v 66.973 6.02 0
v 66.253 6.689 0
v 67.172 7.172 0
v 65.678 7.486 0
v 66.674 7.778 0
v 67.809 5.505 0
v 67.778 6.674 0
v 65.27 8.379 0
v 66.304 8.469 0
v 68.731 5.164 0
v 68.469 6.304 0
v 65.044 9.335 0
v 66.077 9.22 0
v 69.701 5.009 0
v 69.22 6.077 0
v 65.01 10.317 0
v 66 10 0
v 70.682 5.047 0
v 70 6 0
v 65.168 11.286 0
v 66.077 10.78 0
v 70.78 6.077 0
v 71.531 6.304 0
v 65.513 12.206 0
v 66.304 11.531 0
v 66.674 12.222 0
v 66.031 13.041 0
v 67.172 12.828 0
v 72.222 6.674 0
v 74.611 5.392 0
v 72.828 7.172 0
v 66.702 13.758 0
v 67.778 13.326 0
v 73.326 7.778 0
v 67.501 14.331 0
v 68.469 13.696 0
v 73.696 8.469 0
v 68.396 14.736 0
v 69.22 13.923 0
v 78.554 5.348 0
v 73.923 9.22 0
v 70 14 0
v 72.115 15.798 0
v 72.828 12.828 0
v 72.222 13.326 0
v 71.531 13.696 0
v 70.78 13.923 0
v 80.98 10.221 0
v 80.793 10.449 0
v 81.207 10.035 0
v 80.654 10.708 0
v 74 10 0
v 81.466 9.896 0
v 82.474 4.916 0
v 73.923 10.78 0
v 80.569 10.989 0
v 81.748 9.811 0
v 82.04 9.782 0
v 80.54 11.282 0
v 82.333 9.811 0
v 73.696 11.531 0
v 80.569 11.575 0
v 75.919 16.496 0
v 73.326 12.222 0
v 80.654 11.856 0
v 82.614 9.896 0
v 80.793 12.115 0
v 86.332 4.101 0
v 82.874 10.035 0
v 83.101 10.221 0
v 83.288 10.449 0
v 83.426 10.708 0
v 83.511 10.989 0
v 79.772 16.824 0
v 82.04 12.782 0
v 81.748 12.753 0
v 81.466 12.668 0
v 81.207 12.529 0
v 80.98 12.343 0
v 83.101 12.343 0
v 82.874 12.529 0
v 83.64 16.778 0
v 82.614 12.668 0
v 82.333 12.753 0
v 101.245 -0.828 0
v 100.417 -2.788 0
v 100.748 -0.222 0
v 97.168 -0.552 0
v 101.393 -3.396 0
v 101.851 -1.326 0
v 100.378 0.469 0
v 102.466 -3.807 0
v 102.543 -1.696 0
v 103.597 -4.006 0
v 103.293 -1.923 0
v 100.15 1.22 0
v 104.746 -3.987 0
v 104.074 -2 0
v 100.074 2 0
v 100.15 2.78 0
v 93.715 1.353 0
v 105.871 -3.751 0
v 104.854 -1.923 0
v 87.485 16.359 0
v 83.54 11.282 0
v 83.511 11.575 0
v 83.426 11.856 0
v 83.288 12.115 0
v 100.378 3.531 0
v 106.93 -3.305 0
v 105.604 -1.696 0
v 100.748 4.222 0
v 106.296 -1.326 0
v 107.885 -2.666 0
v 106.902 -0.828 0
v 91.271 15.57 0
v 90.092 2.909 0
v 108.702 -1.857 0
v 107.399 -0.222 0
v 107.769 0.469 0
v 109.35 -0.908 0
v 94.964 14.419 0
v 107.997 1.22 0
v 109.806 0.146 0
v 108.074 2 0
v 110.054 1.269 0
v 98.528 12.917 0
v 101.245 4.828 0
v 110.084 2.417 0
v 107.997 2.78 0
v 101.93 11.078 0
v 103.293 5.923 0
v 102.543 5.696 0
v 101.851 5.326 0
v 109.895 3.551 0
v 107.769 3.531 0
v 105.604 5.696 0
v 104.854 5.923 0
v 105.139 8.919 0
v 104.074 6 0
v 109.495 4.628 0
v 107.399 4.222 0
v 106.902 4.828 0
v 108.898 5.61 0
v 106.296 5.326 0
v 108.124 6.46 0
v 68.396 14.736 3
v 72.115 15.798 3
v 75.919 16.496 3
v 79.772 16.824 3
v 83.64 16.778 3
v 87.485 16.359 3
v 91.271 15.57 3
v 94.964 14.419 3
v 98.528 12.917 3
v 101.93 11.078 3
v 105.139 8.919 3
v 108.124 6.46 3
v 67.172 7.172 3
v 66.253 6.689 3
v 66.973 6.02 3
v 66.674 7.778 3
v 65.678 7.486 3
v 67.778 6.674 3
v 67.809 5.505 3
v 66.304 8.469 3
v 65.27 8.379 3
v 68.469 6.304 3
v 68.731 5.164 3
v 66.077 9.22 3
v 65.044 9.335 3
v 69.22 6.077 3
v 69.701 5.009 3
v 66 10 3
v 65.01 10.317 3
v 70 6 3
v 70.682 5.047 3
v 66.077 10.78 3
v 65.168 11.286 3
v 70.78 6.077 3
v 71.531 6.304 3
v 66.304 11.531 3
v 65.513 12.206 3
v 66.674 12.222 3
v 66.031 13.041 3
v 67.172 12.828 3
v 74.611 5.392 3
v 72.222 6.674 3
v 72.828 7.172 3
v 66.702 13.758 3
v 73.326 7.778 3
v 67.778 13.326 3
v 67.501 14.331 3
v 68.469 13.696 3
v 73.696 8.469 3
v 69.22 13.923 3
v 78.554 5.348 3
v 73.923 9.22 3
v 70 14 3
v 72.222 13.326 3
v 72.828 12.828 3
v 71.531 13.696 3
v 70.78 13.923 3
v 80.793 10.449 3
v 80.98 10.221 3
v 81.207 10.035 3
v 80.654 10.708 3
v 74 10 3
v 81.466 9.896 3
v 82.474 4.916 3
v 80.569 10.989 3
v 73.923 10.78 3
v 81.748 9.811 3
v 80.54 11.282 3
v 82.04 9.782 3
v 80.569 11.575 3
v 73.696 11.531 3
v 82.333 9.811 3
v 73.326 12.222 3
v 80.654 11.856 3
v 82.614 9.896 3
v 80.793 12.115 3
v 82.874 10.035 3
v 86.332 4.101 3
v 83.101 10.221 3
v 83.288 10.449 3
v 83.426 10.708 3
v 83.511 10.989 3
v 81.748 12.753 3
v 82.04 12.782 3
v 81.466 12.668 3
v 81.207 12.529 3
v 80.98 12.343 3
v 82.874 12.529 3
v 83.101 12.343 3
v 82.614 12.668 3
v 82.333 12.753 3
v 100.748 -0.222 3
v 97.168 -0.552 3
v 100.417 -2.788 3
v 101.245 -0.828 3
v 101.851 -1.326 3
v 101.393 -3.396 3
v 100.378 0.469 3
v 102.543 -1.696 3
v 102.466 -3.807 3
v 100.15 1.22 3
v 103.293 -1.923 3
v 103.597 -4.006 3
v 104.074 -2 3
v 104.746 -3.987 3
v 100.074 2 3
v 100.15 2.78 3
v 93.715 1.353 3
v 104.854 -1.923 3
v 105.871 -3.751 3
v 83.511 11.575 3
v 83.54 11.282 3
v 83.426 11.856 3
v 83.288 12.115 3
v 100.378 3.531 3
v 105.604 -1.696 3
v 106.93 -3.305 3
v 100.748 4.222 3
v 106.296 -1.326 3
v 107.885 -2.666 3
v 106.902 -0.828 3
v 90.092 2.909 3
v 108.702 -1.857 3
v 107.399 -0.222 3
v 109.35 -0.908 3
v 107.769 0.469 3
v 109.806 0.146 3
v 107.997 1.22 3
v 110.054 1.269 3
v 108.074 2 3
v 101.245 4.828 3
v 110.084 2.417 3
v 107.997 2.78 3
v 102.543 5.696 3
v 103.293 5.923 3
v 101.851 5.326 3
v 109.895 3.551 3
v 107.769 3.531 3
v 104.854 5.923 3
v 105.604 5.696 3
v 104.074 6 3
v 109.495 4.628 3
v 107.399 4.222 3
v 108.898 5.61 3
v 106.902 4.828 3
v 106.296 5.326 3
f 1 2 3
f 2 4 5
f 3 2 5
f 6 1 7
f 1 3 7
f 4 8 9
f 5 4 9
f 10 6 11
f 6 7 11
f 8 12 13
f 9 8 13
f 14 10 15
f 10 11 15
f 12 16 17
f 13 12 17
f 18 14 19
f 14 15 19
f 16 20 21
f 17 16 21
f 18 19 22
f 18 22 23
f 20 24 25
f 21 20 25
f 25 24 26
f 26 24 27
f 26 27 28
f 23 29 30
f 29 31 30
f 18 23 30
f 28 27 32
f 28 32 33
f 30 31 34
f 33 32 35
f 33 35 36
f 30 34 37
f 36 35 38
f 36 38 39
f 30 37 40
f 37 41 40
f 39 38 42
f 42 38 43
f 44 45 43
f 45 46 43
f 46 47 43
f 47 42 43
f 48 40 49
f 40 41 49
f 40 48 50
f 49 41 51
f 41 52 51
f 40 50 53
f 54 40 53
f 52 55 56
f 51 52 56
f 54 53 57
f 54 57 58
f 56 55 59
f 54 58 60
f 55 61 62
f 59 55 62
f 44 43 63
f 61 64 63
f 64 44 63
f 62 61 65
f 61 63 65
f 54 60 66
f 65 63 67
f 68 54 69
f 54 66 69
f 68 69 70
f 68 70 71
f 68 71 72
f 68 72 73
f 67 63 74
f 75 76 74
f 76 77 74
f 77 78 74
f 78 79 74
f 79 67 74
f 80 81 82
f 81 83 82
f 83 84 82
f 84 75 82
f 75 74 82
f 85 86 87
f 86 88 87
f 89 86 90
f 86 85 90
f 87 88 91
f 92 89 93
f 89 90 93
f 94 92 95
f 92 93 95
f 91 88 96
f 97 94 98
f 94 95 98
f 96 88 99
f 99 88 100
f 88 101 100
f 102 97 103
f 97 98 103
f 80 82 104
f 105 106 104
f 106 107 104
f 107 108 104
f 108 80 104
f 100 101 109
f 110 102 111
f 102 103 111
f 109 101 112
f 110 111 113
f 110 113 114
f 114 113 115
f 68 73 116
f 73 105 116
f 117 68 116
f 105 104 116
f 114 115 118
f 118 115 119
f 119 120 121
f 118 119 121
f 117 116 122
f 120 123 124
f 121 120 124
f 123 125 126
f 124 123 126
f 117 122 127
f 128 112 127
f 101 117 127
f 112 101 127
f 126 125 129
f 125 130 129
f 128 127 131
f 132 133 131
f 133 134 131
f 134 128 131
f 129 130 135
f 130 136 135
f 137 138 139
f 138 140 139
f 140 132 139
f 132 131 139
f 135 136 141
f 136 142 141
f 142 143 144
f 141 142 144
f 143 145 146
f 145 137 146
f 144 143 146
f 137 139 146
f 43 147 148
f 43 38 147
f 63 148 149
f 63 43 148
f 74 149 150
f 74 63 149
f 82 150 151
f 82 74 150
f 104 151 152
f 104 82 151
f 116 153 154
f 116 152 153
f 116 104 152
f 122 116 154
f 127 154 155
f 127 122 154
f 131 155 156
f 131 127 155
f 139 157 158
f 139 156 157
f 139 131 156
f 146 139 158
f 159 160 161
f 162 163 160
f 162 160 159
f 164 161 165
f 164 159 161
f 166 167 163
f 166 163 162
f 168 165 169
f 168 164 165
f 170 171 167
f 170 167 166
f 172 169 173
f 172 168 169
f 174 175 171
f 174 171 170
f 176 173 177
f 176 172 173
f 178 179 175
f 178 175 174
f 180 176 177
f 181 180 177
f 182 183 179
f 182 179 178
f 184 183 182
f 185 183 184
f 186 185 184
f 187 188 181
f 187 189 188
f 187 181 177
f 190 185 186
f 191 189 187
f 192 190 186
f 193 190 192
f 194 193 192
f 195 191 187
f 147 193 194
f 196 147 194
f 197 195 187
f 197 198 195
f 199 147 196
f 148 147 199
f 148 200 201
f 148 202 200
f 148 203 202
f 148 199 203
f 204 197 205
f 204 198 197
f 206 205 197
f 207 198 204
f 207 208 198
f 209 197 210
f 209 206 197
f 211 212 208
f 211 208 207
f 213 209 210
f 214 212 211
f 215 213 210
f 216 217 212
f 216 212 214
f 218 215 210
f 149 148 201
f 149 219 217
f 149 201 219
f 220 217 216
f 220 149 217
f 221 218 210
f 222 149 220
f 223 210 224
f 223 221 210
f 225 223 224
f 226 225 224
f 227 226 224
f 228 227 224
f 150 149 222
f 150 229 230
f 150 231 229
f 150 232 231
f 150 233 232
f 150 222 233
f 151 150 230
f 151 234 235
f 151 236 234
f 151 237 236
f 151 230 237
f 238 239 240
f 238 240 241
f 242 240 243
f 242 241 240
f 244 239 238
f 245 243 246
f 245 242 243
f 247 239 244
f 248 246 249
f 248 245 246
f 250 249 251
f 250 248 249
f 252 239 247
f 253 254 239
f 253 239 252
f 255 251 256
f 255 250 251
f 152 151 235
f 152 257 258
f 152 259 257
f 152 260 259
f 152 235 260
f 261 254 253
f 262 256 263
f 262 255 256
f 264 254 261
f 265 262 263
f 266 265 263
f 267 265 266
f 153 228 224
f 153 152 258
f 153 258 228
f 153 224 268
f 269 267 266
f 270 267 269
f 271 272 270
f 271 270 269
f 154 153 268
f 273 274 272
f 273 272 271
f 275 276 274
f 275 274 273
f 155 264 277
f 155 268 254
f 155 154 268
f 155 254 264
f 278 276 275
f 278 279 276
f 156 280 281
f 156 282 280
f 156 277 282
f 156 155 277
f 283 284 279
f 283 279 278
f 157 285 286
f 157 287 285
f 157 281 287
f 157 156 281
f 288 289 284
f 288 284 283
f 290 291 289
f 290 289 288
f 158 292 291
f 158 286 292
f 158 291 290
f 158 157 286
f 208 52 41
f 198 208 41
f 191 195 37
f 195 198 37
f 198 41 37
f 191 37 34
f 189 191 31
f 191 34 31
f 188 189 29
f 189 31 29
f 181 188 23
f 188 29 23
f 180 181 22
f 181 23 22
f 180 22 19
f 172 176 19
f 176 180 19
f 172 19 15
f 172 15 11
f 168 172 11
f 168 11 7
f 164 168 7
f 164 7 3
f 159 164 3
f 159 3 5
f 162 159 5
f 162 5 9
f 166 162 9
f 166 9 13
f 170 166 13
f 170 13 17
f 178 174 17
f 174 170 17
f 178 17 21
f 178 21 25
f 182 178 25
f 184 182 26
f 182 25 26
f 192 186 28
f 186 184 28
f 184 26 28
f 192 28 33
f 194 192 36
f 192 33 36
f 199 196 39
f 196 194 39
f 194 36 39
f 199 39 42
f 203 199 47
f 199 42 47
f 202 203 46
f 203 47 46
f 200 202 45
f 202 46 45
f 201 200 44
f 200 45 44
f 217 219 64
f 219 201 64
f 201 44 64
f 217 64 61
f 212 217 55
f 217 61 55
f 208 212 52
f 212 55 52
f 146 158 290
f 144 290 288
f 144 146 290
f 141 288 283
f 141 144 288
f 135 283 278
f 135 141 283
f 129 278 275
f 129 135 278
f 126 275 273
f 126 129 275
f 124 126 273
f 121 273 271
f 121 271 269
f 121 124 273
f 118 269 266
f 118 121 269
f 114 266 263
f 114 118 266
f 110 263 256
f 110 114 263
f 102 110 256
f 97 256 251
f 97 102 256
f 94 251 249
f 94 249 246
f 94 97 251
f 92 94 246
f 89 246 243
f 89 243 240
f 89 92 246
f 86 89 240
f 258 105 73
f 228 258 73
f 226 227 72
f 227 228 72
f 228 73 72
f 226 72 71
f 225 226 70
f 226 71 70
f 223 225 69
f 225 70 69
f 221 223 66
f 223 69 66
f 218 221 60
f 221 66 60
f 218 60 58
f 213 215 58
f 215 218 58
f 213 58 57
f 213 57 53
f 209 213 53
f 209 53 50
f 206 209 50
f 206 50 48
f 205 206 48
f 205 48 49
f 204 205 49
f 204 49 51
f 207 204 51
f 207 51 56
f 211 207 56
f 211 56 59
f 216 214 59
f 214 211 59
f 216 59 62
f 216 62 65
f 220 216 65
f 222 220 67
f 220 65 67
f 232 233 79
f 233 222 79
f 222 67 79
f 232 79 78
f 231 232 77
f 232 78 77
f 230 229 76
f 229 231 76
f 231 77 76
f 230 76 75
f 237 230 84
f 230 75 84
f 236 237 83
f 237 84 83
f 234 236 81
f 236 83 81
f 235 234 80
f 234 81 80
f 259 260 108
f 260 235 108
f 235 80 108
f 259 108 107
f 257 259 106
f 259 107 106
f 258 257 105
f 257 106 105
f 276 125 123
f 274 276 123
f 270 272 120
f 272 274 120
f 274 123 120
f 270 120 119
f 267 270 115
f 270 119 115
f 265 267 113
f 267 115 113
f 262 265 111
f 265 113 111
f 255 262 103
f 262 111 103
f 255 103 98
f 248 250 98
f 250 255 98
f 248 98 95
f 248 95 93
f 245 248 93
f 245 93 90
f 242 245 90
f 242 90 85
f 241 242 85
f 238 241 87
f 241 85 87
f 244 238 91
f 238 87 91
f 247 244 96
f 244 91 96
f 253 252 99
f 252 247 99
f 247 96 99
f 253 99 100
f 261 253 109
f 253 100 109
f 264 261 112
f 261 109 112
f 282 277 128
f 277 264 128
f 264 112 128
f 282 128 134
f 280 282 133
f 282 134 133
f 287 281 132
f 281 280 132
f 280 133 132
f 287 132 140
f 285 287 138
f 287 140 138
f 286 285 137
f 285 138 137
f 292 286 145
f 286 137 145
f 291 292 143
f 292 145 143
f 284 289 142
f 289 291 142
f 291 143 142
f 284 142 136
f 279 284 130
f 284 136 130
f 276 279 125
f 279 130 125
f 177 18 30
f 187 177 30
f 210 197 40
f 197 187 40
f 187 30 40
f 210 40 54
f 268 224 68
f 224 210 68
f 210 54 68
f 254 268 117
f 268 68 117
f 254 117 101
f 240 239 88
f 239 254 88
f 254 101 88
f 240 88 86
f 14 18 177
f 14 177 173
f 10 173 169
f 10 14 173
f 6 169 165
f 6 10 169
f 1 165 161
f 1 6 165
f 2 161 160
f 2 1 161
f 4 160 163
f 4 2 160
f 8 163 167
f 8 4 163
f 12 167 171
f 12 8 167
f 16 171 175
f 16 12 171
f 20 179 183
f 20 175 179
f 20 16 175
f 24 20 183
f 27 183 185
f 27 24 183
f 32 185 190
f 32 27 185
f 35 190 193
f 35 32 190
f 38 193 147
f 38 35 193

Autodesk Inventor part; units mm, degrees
ref_plane "YZ Plane" through (0, 0, 0) normal (1, 0, 0) x (0, 1, 0)
ref_plane "XZ Plane" through (0, 0, 0) normal (0, 1, 0) x (-1, 0, 0)
ref_plane "XY Plane" through (0, 0, 0) normal (0, 0, 1) x (1, 0, 0)
sketch "スケッチ1" plane through (0, 0, 0) normal (0, 0, 1) x (1, 0, 0)
  circle A0 centre (104.0735, 2) radius 6.025
  arc A1 (100.4168, -2.7885) -> (70.6822, 5.0468) centre (76.1402, -34.5791) ccw
  line L0 (69.7806, -5) -> (104.0735, 2) construction
  circle A2 centre (69.7806, -5) radius 5 construction
  arc A3 (102.7574, -3.8795) -> (72.4739, -9.2126) centre (94.0202, -42.9136) ccw construction
  circle A4 centre (75.3506, 22) radius 5 construction
  circle A5 centre (70, 10) radius 1.5
  circle A6 centre (70, 10) radius 5
  arc A7 (109.4834, 4.652) -> (75.6055, 26.9935) centre (73.5667, -12.9545) ccw construction
  arc A8 (108.1244, 6.4599) -> (68.3957, 14.7356) centre (81.2303, -23.1494) ccw
  arc A9 (105.8851, 7.7462) -> (66.341, -1.371) centre (93.8576, -30.4027) ccw construction
  line L1 (70, 10) -> (104.0735, 2) construction
  circle A10 centre (82.0403, 11.2819) radius 1.5
  line L2 (48.483, 55.1333) -> (82.5564, 47.1333) construction
  line L3 (82.5564, 47.1333) -> (53.8336, 67.1333) construction
  line L4 (82.5564, 47.1333) -> (48.2636, 40.1333) construction
  circle A11 centre (53.8336, 67.1333) radius 5 construction
  circle A12 centre (48.2636, 40.1333) radius 5 construction
  circle A13 centre (48.483, 55.1333) radius 5
  circle A14 centre (82.5564, 47.1333) radius 1.5
  circle A15 centre (82.5564, 47.1333) radius 5
  circle A16 centre (48.483, 55.1333) radius 1.5
  arc A17 (77.6092, 46.4087) -> (54.8703, 62.242) centre (58.8098, 43.6549) ccw construction
  arc A18 (78.225, 44.6356) -> (51.2502, 50.9689) centre (61.7656, 35.1441) ccw
  arc A19 (79.6686, 43.0516) -> (52.5201, 37.51) centre (68.6948, 27.5411) ccw construction
  arc A20 (85.2716, 51.3319) -> (44.1201, 42.9319) centre (68.9807, 26.1405) ccw construction
  arc A21 (86.7799, 49.8095) -> (45.8918, 59.4095) centre (61.4389, 33.7524) ccw
  arc A22 (87.4691, 48.0636) -> (53.0017, 72.0636) centre (57.993, 42.4818) ccw construction
  circle A23 centre (82.5564, 47.1333) radius 4
  circle A24 centre (104.0735, 2) radius 4
  circle A25 centre (70, 10) radius 4
  point P0 (0, 0)
  point P1 (0, 0)
  point P2 (0, 0)
  dimension "d0" = 40
  dimension "d1" = 10
  dimension "d2" = 40
  dimension "d3" = 10
  dimension "d4" = 10
  dimension "d5" = 3
  dimension "d6" = 19
  dimension "d7" = 30
  dimension "d8" = 3
  dimension "d9" = 8
  dimension "d10" = 8
  dimension "d11" = 8
extrude "押し出し1" add sketch "スケッチ1" along normal blind 3 contours A0 | A0 A1 A6 A8 | A6
properties part number "heikousita" material "アルミニウム 2014-T4"
